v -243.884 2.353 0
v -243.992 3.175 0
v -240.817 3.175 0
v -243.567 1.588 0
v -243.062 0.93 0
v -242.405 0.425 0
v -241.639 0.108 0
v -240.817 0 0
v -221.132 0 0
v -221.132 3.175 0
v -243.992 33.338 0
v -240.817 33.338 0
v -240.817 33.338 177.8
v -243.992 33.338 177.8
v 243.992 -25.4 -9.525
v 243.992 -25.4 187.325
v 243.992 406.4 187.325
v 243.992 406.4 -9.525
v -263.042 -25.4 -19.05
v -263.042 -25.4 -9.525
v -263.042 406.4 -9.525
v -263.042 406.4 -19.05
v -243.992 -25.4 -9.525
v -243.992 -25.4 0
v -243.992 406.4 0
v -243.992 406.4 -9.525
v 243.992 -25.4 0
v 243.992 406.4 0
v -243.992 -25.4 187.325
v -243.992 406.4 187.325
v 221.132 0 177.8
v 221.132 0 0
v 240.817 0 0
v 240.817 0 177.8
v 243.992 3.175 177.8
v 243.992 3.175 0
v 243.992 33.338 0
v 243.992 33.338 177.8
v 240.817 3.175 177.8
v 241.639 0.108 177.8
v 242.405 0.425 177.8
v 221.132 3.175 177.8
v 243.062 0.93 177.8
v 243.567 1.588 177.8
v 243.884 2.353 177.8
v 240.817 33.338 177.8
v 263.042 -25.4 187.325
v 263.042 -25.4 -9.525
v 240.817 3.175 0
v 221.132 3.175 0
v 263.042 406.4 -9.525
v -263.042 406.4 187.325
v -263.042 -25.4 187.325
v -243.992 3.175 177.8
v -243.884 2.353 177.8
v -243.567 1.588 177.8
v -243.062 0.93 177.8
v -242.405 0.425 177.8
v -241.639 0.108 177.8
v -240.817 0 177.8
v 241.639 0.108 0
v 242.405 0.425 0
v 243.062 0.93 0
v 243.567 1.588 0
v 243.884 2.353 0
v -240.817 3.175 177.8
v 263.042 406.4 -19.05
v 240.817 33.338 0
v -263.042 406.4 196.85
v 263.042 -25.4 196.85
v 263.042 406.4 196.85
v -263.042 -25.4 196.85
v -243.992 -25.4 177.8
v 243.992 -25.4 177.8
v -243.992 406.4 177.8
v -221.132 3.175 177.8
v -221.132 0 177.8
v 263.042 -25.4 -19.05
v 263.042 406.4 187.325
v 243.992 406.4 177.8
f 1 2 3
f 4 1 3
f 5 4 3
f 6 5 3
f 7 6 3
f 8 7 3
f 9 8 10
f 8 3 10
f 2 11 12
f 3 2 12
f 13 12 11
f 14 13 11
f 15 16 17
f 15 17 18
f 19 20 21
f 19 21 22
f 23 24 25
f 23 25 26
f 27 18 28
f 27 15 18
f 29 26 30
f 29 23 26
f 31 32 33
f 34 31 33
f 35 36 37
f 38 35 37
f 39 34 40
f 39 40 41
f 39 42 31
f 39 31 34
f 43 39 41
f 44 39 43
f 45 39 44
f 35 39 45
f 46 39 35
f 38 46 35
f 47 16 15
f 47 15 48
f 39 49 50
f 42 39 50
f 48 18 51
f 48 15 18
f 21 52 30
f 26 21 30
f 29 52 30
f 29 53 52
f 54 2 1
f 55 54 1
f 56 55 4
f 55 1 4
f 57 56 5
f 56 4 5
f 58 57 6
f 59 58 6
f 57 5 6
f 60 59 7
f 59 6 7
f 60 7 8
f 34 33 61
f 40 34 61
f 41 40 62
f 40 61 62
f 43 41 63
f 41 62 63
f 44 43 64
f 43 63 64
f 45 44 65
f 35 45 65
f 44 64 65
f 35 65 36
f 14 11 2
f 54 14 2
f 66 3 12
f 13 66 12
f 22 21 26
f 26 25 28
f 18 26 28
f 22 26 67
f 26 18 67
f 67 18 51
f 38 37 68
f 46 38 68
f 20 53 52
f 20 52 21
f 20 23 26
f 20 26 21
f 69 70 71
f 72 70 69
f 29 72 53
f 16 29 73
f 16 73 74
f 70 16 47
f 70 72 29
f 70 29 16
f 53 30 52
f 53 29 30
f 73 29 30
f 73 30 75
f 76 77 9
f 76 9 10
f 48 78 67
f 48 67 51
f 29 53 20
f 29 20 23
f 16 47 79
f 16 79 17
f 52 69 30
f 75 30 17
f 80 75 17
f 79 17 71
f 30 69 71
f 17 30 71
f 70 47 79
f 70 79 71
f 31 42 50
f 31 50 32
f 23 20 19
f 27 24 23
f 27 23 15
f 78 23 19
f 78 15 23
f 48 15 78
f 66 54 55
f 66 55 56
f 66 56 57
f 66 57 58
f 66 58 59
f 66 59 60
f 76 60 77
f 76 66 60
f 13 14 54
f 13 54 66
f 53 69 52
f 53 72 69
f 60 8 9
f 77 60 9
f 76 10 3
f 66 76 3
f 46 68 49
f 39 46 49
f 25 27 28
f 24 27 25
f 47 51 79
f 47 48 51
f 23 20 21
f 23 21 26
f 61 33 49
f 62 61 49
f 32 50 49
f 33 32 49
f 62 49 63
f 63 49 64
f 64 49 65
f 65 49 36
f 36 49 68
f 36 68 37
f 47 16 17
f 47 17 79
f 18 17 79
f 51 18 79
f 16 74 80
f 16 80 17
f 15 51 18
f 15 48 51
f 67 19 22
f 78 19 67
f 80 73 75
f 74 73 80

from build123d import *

# Parameters (mm, degrees)
F1_DEPTH      = 177.8
F3_DEPTH      = 25.4
F3_DEPTH_BACK = 406.4
F5_DEPTH      = 25.4
F5_DEPTH_BACK = 406.4


with BuildPart() as f1:
    # F0 (on Top) → F1 (new body)
    with BuildSketch(Plane.XY):
        with BuildLine():
            Line((-243.9924, 33.3375), (-243.9924, 3.175))
            ThreePointArc((-243.9924, 3.175), (-243.062464, 0.929936), (-240.8174, 0))
            Line((-240.8174, 0), (-221.1324, 0))
            Line((-221.1324, 0), (-221.1324, 3.175))
            Line((-221.1324, 3.175), (-240.8174, 3.175))
            Line((-240.8174, 3.175), (-240.8174, 33.3375))
            Line((-240.8174, 33.3375), (-243.9924, 33.3375))
        make_face()
        with BuildLine():
            ThreePointArc((240.8174, 0), (243.062464, 0.929936), (243.9924, 3.175))
            Line((243.9924, 3.175), (243.9924, 33.3375))
            Line((243.9924, 33.3375), (240.8174, 33.3375))
            Line((240.8174, 33.3375), (240.8174, 3.175))
            Line((240.8174, 3.175), (221.1324, 3.175))
            Line((221.1324, 3.175), (221.1324, 0))
            Line((221.1324, 0), (240.8174, 0))
        make_face()
    extrude(amount=F1_DEPTH)


with BuildPart() as f3:
    # F2 (on Front) → F3 (new body, two sides)
    with BuildSketch(Plane.XZ) as f3_sk:
        Polygon((-243.9924, 0), (-243.9924, 177.8), (-243.9924, 187.325), (-263.0424, 187.325), (-263.0424, 177.8), (-263.0424, 0), (-263.0424, -9.525), (-243.9924, -9.525), align=None)
        Polygon((263.0424, -9.525), (263.0424, 0), (263.0424, 177.8), (263.0424, 187.325), (243.9924, 187.325), (243.9924, 177.8), (243.9924, 0), (243.9924, -9.525), align=None)
    extrude(amount=F3_DEPTH)
    extrude(f3_sk.sketch, amount=-F3_DEPTH_BACK)


with BuildPart() as f5:
    # F4 (on Front) → F5 (new body, two sides)
    with BuildSketch(Plane.XZ) as f5_sk:
        Polygon((243.9924, 0), (-243.9924, 0), (-243.9924, -9.525), (-263.0424, -9.525), (-263.0424, -19.05), (263.0424, -19.05), (263.0424, -9.525), (243.9924, -9.525), align=None)
        Polygon((-263.0424, 187.325), (-243.9924, 187.325), (-243.9924, 177.8), (243.9924, 177.8), (243.9924, 187.325), (263.0424, 187.325), (263.0424, 196.85), (-263.0424, 196.85), align=None)
    extrude(amount=F5_DEPTH)
    extrude(f5_sk.sketch, amount=-F5_DEPTH_BACK)


solid = Compound([f1.part, f3.part, f5.part])
